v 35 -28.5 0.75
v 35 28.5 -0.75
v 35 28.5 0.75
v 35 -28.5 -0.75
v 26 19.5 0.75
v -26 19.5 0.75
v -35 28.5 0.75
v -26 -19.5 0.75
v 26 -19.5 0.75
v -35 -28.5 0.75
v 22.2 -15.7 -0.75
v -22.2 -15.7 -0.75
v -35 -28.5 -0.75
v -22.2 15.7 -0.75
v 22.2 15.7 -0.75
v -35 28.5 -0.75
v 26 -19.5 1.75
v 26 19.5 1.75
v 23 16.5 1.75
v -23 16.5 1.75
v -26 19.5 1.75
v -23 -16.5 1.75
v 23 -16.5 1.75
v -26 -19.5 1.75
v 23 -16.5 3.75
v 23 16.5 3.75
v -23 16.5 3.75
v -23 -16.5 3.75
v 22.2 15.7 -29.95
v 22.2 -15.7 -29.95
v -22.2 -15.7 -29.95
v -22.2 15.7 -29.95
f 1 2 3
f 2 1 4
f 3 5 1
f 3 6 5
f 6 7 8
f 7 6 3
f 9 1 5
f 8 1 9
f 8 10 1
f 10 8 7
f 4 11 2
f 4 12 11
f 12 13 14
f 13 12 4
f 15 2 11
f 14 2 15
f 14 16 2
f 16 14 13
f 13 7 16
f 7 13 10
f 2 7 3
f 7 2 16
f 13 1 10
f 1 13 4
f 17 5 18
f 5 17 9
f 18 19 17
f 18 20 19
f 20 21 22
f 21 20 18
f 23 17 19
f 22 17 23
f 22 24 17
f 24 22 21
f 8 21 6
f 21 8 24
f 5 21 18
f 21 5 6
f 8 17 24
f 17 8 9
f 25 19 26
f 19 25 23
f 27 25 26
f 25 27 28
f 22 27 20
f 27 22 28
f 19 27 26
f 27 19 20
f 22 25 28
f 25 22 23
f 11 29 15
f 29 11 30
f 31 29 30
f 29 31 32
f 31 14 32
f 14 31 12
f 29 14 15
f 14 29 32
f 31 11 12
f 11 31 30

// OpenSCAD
// Parameters
cutout_width_mm = 40; //[20:80:0.1]
cutout_height_mm = 27; //[13.5:54:0.1]
panel_thickness_mm = 1.5; //[0.8:3:0.1]
flange_thickness_mm = 2; //[1:4:0.1]
bezel_thickness_mm = 2; //[1:4:0.1]
corner_radius_mm = 1; //[0:3:0.1]
mounting_holes_enabled = 1; //[0:1:1]
mounting_hole_diameter_mm = 3.2; //[2:6.5:0.1]
mounting_hole_pitch_mm = 36; //[18:72:0.1]
body_depth_mm = 30; //[15:60:0.5]
clearance_mm = 0.2; //[0:1:0.05]
overlap_mm = 1; //[0.5:2:0.1]
panel_margin_mm = 15; //[5:40:1]
flange_margin_mm = 6; //[3:15:0.5]
bezel_margin_mm = 3; //[1:10:0.5]
body_wall_mm = 2; //[1:4:0.1]
terminal_clearance_depth_mm = 18; //[10:35:0.5]
terminal_clearance_width_mm = 28; //[15:45:0.5]
terminal_clearance_height_mm = 22; //[12:40:0.5]

// IEC Inlet - complete geometry
module iec() {
  color("Black") {
    // Front Flange
    translate([0, 0, panel_thickness_mm/2 + flange_thickness_mm/2 - overlap_mm])
      cube([cutout_width_mm + 2*flange_margin_mm, cutout_height_mm + 2*flange_margin_mm, flange_thickness_mm], center=true);
    
    // Front Bezel
    translate([0, 0, panel_thickness_mm/2 + flange_thickness_mm + bezel_thickness_mm/2 - overlap_mm])
      cube([cutout_width_mm + 2*bezel_margin_mm, cutout_height_mm + 2*bezel_margin_mm, bezel_thickness_mm], center=true);
    
    // IEC Inlet Body
    translate([0, 0, -panel_thickness_mm/2 - body_depth_mm/2 + overlap_mm])
      cube([cutout_width_mm + 2*body_wall_mm, cutout_height_mm + 2*body_wall_mm, body_depth_mm], center=true);
  }
}

// Mod - complete geometry
module mod() {
  color("Silver") {
    // Rear Body Depth Clearance
    translate([0, 0, -panel_thickness_mm/2 - (body_depth_mm + clearance_mm)/2 + overlap_mm])
      cube([cutout_width_mm + 2*(body_wall_mm + clearance_mm), cutout_height_mm + 2*(body_wall_mm + clearance_mm), body_depth_mm + clearance_mm], center=true);
    
    // Terminal Spade Clearance
    translate([0, 0, -panel_thickness_mm/2 - body_depth_mm + terminal_clearance_depth_mm/2 + overlap_mm])
      cube([terminal_clearance_width_mm, terminal_clearance_height_mm, terminal_clearance_depth_mm], center=true);
  }
}

// Panel with cutout and mounting holes
module panel_with_cutout() {
  difference() {
    // Panel Slab
    color([0.85, 0.85, 0.8]) // Off-white for 3D printed PLA
    cube([cutout_width_mm + 2*panel_margin_mm, cutout_height_mm + 2*panel_margin_mm, panel_thickness_mm], center=true);
    
    // Panel Cutout
    cube([cutout_width_mm + 2*clearance_mm, cutout_height_mm + 2*clearance_mm, panel_thickness_mm + 2*overlap_mm], center=true);
    
    // Mounting Holes
    if (mounting_holes_enabled) {
      translate([-mounting_hole_pitch_mm/2, 0, 0])
        cylinder(h=panel_thickness_mm + 2*overlap_mm, r=mounting_hole_diameter_mm/2, center=true);
      translate([mounting_hole_pitch_mm/2, 0, 0])
        cylinder(h=panel_thickness_mm + 2*overlap_mm, r=mounting_hole_diameter_mm/2, center=true);
    }
  }
}

// Assembly
module assembly() {
  panel_with_cutout();
  iec();
  mod();
}

assembly();
